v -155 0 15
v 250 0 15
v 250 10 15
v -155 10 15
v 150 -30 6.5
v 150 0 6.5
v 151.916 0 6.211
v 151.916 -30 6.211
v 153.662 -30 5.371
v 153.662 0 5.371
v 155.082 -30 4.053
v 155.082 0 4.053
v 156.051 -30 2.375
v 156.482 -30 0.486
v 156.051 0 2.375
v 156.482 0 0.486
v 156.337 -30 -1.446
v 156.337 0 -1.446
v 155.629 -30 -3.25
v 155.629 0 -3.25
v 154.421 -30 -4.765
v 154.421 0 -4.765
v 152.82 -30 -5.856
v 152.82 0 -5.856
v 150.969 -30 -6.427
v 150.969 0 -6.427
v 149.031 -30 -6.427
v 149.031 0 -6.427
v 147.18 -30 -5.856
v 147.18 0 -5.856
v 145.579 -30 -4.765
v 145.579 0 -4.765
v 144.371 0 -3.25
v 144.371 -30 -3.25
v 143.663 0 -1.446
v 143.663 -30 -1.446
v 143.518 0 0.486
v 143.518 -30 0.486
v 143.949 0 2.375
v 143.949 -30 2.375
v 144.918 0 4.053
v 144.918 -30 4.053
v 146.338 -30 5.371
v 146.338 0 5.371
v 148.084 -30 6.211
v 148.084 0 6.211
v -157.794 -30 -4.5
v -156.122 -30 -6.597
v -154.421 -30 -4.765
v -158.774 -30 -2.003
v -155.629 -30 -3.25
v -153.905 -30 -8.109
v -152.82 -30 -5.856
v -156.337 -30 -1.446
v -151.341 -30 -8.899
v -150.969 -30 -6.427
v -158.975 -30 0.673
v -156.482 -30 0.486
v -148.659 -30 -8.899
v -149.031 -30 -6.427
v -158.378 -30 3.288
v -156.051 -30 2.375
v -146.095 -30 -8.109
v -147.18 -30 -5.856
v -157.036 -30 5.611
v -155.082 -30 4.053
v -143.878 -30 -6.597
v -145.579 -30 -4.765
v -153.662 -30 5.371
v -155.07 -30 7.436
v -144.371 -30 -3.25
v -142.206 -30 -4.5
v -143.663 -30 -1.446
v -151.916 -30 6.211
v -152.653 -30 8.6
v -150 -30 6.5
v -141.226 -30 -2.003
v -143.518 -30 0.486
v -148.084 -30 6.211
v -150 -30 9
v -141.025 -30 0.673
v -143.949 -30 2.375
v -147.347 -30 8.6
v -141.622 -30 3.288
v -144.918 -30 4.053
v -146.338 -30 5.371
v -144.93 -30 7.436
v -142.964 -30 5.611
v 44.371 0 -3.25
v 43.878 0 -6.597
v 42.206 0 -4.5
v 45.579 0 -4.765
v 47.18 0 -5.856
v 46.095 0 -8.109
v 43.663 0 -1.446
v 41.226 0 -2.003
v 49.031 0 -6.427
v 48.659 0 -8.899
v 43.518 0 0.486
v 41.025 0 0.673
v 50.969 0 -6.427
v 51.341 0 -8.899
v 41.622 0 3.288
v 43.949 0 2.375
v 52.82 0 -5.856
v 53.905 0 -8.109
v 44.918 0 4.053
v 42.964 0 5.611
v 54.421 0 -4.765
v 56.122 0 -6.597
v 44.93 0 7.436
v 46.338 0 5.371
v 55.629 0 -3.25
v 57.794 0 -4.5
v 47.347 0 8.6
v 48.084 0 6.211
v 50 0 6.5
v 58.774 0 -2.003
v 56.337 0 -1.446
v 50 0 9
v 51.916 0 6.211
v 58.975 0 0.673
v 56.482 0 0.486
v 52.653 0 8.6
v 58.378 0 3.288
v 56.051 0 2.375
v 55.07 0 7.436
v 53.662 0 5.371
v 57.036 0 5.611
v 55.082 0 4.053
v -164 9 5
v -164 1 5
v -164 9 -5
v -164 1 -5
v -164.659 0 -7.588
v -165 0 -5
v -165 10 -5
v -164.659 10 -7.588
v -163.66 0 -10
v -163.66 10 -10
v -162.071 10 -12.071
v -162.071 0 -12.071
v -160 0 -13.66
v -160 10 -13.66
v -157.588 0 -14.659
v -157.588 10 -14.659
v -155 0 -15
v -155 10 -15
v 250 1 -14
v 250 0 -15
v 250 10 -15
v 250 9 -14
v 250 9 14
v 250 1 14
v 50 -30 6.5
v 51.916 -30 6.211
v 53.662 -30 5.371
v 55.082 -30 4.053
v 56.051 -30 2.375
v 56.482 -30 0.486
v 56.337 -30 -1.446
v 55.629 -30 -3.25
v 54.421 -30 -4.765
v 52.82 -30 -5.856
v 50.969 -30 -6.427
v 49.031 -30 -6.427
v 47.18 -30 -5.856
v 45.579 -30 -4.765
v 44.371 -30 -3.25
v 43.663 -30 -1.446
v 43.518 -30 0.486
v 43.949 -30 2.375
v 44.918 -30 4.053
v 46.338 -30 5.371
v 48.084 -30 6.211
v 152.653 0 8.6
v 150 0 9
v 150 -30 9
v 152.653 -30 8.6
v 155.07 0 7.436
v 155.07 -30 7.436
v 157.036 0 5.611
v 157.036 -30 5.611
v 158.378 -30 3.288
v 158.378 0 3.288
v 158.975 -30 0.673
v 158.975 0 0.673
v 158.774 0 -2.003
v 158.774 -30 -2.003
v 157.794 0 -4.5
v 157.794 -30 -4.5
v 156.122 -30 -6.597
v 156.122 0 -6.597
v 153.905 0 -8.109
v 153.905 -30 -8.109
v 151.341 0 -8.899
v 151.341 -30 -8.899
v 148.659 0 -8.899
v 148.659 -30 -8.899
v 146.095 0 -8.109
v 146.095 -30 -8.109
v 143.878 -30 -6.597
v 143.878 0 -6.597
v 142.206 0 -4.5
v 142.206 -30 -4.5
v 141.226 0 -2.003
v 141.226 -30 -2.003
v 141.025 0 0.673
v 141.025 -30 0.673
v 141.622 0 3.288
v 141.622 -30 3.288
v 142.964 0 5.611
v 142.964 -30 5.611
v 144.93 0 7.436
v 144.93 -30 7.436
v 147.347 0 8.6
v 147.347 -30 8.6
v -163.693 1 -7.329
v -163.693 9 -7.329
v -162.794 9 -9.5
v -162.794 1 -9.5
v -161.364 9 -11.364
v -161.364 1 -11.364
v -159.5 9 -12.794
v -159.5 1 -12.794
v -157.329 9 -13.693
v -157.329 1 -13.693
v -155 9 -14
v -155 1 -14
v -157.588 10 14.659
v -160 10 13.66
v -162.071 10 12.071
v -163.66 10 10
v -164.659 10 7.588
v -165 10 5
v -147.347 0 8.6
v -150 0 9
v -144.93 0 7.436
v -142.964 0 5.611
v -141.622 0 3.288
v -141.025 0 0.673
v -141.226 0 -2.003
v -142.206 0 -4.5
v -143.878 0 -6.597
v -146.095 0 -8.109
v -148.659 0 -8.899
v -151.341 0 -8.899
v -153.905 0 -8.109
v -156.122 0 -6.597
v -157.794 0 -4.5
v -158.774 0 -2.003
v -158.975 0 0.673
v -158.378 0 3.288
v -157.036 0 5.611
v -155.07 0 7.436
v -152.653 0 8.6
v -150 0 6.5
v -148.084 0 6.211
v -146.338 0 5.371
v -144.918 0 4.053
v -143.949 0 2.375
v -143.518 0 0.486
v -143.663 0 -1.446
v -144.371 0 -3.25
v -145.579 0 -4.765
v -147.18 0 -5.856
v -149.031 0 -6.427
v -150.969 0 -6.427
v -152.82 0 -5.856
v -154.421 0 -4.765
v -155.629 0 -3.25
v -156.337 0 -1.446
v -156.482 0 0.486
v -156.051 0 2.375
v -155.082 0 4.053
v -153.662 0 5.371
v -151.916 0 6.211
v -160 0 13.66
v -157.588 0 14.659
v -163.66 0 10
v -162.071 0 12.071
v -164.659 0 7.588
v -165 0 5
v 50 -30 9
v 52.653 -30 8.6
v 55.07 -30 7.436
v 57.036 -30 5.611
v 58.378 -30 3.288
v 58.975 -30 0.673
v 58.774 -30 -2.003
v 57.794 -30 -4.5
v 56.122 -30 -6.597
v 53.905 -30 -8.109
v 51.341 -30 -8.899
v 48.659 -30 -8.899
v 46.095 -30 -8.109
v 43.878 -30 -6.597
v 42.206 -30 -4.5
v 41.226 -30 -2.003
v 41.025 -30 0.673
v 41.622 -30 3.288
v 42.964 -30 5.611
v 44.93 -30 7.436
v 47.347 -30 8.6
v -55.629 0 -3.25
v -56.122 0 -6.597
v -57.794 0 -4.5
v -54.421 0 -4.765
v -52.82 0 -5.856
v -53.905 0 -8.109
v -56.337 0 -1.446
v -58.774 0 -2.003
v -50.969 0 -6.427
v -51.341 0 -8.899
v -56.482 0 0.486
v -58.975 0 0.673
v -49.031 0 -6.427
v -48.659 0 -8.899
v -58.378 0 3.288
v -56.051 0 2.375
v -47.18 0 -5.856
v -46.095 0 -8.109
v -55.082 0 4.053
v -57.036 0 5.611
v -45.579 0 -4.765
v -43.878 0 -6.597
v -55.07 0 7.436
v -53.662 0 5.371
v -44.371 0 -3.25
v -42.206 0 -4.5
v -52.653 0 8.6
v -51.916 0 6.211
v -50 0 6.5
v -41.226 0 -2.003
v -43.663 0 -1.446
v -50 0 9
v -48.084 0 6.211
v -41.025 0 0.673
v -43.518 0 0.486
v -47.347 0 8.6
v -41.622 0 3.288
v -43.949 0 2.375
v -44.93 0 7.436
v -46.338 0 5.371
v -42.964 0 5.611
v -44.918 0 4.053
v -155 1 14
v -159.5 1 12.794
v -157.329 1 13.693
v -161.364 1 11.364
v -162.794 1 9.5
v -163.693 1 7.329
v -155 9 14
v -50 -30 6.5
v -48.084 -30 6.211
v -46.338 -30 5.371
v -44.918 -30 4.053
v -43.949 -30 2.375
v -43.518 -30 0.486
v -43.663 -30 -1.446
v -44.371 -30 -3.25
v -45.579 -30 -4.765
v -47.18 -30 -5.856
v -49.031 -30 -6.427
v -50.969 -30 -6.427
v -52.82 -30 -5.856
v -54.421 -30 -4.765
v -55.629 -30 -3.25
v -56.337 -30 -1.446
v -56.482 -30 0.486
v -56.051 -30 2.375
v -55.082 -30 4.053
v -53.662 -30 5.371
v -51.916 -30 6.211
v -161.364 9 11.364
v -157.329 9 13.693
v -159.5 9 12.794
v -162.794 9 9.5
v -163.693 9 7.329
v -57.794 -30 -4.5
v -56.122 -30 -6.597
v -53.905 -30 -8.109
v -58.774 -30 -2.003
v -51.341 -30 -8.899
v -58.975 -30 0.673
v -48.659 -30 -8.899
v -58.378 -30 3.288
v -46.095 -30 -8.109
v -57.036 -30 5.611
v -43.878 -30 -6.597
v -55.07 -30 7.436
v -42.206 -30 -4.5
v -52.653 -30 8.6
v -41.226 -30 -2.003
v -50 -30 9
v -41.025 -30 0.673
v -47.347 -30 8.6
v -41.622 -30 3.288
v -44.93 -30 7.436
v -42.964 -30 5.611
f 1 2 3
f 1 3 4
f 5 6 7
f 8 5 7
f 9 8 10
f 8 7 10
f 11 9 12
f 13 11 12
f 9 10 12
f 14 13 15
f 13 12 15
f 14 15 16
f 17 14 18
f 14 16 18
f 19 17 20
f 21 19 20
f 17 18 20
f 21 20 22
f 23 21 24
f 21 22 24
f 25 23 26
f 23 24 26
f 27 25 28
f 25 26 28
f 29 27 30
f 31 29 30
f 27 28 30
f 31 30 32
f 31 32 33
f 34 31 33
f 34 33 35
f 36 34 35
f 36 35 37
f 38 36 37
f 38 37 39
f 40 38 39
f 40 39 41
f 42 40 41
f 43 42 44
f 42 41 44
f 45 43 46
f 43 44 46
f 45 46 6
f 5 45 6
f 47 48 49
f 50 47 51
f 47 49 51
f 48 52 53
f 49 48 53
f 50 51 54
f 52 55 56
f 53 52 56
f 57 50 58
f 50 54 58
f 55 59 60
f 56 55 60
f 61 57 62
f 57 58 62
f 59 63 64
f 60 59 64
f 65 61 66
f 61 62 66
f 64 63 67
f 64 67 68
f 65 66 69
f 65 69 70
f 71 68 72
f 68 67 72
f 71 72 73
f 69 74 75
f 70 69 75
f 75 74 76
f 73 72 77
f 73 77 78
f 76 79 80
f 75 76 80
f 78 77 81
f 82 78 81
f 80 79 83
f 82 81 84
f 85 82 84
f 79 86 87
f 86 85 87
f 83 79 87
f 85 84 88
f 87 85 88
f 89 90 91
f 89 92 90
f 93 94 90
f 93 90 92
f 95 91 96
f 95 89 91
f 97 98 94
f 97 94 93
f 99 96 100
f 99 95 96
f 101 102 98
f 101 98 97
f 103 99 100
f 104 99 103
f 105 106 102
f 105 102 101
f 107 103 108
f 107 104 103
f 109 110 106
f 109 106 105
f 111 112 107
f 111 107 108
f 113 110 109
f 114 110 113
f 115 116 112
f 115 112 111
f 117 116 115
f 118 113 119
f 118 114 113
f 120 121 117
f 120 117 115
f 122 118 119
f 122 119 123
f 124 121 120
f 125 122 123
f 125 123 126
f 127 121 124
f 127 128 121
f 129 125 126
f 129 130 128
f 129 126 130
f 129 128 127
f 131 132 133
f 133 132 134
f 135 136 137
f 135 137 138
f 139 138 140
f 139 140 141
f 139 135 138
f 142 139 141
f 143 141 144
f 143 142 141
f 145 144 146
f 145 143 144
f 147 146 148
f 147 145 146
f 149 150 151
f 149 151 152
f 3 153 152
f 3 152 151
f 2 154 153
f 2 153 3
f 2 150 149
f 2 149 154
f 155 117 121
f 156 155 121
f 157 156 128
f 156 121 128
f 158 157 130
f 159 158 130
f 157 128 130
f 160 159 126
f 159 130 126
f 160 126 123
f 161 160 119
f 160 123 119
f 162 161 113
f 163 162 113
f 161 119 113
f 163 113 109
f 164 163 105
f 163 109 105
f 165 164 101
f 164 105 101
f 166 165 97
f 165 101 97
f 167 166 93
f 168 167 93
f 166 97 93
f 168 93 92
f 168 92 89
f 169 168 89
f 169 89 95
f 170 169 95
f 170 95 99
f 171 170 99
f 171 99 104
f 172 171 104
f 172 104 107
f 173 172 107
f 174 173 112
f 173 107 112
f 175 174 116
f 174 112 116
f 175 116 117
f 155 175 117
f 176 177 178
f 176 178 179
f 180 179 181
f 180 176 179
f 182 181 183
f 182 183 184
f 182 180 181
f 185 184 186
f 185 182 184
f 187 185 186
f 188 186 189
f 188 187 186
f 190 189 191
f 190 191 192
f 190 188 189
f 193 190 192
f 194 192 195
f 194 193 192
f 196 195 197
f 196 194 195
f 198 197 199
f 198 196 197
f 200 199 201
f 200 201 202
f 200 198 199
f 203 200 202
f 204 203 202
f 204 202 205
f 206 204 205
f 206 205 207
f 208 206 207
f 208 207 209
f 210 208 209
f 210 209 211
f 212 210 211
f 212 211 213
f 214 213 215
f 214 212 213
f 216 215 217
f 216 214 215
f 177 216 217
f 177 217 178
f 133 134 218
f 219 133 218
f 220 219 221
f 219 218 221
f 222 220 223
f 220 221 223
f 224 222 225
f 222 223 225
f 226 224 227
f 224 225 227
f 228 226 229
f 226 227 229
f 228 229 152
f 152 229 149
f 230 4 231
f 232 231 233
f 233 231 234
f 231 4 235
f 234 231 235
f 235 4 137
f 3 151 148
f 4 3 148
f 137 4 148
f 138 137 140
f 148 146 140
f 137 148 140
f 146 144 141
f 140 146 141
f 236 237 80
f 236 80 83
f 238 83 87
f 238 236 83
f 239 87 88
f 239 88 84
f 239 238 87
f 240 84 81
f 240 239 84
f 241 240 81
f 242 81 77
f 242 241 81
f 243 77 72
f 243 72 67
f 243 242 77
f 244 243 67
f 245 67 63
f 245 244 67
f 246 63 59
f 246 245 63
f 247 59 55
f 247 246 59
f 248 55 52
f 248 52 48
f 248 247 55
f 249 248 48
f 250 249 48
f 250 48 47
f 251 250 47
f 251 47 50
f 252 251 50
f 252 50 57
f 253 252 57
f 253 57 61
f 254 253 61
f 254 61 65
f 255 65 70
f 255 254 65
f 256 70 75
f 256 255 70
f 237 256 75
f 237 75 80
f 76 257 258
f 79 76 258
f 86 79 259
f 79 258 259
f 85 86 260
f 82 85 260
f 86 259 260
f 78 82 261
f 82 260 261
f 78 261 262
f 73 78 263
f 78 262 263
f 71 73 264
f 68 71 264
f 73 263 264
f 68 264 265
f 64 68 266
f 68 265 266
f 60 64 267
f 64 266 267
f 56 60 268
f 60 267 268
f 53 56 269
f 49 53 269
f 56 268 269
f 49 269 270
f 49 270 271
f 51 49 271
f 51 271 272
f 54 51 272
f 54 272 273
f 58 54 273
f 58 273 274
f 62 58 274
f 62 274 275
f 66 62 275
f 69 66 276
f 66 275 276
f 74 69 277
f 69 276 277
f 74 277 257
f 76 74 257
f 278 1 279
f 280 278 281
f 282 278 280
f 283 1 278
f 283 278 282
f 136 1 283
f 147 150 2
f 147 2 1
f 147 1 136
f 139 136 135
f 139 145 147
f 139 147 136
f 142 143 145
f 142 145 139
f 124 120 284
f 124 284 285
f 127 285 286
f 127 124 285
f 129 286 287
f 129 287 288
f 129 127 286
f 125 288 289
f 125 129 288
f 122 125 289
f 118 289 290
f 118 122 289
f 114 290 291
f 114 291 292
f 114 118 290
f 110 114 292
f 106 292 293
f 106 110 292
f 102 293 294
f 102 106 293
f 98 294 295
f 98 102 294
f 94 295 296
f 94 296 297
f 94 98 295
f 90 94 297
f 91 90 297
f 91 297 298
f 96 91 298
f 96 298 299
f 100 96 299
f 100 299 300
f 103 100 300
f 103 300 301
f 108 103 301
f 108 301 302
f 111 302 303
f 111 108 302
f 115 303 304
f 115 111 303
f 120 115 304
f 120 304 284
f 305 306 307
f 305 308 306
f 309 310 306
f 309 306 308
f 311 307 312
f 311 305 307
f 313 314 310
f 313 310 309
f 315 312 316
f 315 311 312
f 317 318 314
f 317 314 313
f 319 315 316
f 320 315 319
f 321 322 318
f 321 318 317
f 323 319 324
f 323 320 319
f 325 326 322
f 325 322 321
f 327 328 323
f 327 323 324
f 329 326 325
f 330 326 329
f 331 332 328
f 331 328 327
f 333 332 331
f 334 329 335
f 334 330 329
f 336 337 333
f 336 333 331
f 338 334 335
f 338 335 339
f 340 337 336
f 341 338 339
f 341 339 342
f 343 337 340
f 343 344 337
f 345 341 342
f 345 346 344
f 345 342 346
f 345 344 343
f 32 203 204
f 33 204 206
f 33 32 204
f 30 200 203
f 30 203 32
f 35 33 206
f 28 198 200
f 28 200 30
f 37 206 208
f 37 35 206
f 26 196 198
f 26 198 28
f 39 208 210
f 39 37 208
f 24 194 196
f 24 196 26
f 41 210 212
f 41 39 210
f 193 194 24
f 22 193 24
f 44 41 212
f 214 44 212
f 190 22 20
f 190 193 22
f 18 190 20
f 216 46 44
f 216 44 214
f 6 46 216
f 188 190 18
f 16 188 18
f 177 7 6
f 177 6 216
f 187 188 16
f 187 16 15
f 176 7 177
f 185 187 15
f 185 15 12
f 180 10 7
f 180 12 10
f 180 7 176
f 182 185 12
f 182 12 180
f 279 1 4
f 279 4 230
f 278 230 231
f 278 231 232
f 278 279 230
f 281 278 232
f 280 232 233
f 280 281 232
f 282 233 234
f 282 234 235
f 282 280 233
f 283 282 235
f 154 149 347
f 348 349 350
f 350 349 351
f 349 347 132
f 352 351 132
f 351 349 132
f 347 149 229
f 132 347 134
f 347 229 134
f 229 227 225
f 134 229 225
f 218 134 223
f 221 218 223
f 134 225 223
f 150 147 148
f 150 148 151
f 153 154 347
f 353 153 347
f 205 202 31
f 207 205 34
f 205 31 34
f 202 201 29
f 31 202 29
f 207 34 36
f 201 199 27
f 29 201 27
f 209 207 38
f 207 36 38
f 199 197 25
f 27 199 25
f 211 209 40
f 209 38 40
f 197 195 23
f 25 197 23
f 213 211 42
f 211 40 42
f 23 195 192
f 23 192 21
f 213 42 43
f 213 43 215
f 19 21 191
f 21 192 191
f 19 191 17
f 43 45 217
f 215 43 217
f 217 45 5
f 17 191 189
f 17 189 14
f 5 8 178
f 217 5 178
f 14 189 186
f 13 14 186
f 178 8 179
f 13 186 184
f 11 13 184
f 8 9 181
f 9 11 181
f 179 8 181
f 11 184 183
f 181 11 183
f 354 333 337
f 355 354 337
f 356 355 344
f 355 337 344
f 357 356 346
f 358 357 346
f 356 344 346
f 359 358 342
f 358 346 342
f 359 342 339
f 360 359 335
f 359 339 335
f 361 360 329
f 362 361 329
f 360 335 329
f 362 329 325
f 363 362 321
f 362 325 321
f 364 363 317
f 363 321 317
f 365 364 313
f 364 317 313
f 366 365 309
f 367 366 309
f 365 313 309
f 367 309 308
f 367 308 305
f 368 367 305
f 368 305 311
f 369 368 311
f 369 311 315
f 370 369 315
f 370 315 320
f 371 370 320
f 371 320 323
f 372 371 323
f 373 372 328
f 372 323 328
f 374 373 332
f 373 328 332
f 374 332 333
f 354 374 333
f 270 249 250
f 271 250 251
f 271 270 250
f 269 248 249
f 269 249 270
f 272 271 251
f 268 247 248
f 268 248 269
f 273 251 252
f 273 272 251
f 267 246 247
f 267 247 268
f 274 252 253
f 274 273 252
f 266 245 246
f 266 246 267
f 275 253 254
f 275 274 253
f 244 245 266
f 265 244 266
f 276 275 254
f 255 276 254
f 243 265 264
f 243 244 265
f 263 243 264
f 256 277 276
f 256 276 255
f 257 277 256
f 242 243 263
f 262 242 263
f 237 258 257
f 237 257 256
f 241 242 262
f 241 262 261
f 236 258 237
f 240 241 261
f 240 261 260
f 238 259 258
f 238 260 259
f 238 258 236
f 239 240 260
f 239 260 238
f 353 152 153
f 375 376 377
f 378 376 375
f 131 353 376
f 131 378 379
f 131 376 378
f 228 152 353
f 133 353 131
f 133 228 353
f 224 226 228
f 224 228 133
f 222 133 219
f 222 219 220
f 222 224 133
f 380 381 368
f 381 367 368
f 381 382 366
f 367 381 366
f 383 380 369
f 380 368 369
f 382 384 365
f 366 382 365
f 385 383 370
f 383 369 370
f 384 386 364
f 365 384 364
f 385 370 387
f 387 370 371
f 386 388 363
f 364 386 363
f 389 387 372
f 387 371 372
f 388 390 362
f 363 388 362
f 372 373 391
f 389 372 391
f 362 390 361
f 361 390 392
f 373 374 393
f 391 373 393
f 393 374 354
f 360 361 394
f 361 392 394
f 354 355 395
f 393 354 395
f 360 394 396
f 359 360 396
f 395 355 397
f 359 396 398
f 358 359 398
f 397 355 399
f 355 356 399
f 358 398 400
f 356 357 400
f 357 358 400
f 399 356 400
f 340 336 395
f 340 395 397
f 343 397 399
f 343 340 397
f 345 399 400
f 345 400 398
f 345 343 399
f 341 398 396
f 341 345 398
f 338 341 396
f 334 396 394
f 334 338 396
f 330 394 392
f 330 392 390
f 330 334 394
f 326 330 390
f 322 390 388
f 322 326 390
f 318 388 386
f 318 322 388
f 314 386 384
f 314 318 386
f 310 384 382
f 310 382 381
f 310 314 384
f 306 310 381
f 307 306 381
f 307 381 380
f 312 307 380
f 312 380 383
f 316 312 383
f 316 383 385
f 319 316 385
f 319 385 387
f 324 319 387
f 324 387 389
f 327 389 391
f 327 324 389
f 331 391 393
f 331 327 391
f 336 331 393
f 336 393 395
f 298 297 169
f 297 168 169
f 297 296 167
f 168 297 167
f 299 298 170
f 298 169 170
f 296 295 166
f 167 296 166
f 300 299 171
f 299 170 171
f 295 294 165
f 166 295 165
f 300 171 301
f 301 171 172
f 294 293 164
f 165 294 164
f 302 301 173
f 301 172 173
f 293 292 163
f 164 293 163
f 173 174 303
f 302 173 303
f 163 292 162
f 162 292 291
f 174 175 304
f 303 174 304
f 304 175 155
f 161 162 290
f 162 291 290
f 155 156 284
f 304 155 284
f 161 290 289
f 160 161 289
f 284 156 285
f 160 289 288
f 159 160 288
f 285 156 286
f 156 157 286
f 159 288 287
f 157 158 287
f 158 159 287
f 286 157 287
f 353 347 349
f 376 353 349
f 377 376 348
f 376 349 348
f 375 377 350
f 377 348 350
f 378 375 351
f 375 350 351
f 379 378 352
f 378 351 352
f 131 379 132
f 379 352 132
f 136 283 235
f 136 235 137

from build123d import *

# Parameters (mm, degrees)
SKETCH1_R             = 9
SKETCH1_R_2           = 6.5
BOSS_EXTRUDE1_DEPTH   = 30
BOSS_EXTRUDE1_2_DEPTH = 30
BOSS_EXTRUDE1_3_DEPTH = 30
BOSS_EXTRUDE1_4_DEPTH = 30
BOSS_EXTRUDE2_DEPTH   = 10
SHELL3_T              = -1


with BuildPart() as part:
    # Sketch1 → Boss-Extrude1 (new body)
    with BuildSketch(Plane(origin=(0, 0, 0), x_dir=(1, 0, 0), z_dir=(0, 1, 0))):
        with Locations(Location((-150, 0, 0), (0, 0, 270))):
            Circle(SKETCH1_R)
        with Locations(Location((-150, 0, 0), (0, 0, 270))):
            Circle(SKETCH1_R_2, mode=Mode.SUBTRACT)
    extrude(amount=-BOSS_EXTRUDE1_DEPTH)


with BuildPart() as body_2:
    # Sketch1 → Boss-Extrude1 2 (new body)
    with BuildSketch(Plane(origin=(0, 0, 0), x_dir=(1, 0, 0), z_dir=(0, 1, 0))):
        with Locations(Location((-50, 0, 0), (0, 0, 270))):
            Circle(SKETCH1_R)
        with Locations(Location((-50, 0, 0), (0, 0, 270))):
            Circle(SKETCH1_R_2, mode=Mode.SUBTRACT)
    extrude(amount=-BOSS_EXTRUDE1_2_DEPTH)


with BuildPart() as body_3:
    # Sketch1 → Boss-Extrude1 3 (new body)
    with BuildSketch(Plane(origin=(0, 0, 0), x_dir=(1, 0, 0), z_dir=(0, 1, 0))):
        with Locations(Location((50, 0, 0), (0, 0, 270))):
            Circle(SKETCH1_R)
        with Locations(Location((50, 0, 0), (0, 0, 270))):
            Circle(SKETCH1_R_2, mode=Mode.SUBTRACT)
    extrude(amount=-BOSS_EXTRUDE1_3_DEPTH)


with BuildPart() as body_4:
    # Sketch1 → Boss-Extrude1 4 (new body)
    with BuildSketch(Plane(origin=(0, 0, 0), x_dir=(1, 0, 0), z_dir=(0, 1, 0))):
        with Locations(Location((150, 0, 0), (0, 0, 270))):
            Circle(SKETCH1_R)
        with Locations(Location((150, 0, 0), (0, 0, 270))):
            Circle(SKETCH1_R_2, mode=Mode.SUBTRACT)
    extrude(amount=-BOSS_EXTRUDE1_4_DEPTH)


with BuildPart() as body_5:
    # Sketch2 → Boss-Extrude2 (new body)
    with BuildSketch(Plane(origin=(0, 0, 0), x_dir=(1, 0, 0), z_dir=(0, 1, 0))):
        with BuildLine():
            Line((-155, 15), (250, 15))
            Line((250, 15), (250, -15))
            Line((250, -15), (-155, -15))
            ThreePointArc((-155, -15), (-162.071067812, -12.071067812), (-165, -5))
            Line((-165, -5), (-165, 5))
            ThreePointArc((-165, 5), (-162.071067812, 12.071067812), (-155, 15))
        make_face()
    extrude(amount=BOSS_EXTRUDE2_DEPTH)

    # Shell3
    shell3_openings = [body_5.faces().sort_by_distance(p)[0] for p in [
        (250, 5, 0),
    ]]
    offset(amount=SHELL3_T, openings=shell3_openings, kind=Kind.INTERSECTION)


solid = Compound([part.part, body_2.part, body_3.part, body_4.part, body_5.part])
